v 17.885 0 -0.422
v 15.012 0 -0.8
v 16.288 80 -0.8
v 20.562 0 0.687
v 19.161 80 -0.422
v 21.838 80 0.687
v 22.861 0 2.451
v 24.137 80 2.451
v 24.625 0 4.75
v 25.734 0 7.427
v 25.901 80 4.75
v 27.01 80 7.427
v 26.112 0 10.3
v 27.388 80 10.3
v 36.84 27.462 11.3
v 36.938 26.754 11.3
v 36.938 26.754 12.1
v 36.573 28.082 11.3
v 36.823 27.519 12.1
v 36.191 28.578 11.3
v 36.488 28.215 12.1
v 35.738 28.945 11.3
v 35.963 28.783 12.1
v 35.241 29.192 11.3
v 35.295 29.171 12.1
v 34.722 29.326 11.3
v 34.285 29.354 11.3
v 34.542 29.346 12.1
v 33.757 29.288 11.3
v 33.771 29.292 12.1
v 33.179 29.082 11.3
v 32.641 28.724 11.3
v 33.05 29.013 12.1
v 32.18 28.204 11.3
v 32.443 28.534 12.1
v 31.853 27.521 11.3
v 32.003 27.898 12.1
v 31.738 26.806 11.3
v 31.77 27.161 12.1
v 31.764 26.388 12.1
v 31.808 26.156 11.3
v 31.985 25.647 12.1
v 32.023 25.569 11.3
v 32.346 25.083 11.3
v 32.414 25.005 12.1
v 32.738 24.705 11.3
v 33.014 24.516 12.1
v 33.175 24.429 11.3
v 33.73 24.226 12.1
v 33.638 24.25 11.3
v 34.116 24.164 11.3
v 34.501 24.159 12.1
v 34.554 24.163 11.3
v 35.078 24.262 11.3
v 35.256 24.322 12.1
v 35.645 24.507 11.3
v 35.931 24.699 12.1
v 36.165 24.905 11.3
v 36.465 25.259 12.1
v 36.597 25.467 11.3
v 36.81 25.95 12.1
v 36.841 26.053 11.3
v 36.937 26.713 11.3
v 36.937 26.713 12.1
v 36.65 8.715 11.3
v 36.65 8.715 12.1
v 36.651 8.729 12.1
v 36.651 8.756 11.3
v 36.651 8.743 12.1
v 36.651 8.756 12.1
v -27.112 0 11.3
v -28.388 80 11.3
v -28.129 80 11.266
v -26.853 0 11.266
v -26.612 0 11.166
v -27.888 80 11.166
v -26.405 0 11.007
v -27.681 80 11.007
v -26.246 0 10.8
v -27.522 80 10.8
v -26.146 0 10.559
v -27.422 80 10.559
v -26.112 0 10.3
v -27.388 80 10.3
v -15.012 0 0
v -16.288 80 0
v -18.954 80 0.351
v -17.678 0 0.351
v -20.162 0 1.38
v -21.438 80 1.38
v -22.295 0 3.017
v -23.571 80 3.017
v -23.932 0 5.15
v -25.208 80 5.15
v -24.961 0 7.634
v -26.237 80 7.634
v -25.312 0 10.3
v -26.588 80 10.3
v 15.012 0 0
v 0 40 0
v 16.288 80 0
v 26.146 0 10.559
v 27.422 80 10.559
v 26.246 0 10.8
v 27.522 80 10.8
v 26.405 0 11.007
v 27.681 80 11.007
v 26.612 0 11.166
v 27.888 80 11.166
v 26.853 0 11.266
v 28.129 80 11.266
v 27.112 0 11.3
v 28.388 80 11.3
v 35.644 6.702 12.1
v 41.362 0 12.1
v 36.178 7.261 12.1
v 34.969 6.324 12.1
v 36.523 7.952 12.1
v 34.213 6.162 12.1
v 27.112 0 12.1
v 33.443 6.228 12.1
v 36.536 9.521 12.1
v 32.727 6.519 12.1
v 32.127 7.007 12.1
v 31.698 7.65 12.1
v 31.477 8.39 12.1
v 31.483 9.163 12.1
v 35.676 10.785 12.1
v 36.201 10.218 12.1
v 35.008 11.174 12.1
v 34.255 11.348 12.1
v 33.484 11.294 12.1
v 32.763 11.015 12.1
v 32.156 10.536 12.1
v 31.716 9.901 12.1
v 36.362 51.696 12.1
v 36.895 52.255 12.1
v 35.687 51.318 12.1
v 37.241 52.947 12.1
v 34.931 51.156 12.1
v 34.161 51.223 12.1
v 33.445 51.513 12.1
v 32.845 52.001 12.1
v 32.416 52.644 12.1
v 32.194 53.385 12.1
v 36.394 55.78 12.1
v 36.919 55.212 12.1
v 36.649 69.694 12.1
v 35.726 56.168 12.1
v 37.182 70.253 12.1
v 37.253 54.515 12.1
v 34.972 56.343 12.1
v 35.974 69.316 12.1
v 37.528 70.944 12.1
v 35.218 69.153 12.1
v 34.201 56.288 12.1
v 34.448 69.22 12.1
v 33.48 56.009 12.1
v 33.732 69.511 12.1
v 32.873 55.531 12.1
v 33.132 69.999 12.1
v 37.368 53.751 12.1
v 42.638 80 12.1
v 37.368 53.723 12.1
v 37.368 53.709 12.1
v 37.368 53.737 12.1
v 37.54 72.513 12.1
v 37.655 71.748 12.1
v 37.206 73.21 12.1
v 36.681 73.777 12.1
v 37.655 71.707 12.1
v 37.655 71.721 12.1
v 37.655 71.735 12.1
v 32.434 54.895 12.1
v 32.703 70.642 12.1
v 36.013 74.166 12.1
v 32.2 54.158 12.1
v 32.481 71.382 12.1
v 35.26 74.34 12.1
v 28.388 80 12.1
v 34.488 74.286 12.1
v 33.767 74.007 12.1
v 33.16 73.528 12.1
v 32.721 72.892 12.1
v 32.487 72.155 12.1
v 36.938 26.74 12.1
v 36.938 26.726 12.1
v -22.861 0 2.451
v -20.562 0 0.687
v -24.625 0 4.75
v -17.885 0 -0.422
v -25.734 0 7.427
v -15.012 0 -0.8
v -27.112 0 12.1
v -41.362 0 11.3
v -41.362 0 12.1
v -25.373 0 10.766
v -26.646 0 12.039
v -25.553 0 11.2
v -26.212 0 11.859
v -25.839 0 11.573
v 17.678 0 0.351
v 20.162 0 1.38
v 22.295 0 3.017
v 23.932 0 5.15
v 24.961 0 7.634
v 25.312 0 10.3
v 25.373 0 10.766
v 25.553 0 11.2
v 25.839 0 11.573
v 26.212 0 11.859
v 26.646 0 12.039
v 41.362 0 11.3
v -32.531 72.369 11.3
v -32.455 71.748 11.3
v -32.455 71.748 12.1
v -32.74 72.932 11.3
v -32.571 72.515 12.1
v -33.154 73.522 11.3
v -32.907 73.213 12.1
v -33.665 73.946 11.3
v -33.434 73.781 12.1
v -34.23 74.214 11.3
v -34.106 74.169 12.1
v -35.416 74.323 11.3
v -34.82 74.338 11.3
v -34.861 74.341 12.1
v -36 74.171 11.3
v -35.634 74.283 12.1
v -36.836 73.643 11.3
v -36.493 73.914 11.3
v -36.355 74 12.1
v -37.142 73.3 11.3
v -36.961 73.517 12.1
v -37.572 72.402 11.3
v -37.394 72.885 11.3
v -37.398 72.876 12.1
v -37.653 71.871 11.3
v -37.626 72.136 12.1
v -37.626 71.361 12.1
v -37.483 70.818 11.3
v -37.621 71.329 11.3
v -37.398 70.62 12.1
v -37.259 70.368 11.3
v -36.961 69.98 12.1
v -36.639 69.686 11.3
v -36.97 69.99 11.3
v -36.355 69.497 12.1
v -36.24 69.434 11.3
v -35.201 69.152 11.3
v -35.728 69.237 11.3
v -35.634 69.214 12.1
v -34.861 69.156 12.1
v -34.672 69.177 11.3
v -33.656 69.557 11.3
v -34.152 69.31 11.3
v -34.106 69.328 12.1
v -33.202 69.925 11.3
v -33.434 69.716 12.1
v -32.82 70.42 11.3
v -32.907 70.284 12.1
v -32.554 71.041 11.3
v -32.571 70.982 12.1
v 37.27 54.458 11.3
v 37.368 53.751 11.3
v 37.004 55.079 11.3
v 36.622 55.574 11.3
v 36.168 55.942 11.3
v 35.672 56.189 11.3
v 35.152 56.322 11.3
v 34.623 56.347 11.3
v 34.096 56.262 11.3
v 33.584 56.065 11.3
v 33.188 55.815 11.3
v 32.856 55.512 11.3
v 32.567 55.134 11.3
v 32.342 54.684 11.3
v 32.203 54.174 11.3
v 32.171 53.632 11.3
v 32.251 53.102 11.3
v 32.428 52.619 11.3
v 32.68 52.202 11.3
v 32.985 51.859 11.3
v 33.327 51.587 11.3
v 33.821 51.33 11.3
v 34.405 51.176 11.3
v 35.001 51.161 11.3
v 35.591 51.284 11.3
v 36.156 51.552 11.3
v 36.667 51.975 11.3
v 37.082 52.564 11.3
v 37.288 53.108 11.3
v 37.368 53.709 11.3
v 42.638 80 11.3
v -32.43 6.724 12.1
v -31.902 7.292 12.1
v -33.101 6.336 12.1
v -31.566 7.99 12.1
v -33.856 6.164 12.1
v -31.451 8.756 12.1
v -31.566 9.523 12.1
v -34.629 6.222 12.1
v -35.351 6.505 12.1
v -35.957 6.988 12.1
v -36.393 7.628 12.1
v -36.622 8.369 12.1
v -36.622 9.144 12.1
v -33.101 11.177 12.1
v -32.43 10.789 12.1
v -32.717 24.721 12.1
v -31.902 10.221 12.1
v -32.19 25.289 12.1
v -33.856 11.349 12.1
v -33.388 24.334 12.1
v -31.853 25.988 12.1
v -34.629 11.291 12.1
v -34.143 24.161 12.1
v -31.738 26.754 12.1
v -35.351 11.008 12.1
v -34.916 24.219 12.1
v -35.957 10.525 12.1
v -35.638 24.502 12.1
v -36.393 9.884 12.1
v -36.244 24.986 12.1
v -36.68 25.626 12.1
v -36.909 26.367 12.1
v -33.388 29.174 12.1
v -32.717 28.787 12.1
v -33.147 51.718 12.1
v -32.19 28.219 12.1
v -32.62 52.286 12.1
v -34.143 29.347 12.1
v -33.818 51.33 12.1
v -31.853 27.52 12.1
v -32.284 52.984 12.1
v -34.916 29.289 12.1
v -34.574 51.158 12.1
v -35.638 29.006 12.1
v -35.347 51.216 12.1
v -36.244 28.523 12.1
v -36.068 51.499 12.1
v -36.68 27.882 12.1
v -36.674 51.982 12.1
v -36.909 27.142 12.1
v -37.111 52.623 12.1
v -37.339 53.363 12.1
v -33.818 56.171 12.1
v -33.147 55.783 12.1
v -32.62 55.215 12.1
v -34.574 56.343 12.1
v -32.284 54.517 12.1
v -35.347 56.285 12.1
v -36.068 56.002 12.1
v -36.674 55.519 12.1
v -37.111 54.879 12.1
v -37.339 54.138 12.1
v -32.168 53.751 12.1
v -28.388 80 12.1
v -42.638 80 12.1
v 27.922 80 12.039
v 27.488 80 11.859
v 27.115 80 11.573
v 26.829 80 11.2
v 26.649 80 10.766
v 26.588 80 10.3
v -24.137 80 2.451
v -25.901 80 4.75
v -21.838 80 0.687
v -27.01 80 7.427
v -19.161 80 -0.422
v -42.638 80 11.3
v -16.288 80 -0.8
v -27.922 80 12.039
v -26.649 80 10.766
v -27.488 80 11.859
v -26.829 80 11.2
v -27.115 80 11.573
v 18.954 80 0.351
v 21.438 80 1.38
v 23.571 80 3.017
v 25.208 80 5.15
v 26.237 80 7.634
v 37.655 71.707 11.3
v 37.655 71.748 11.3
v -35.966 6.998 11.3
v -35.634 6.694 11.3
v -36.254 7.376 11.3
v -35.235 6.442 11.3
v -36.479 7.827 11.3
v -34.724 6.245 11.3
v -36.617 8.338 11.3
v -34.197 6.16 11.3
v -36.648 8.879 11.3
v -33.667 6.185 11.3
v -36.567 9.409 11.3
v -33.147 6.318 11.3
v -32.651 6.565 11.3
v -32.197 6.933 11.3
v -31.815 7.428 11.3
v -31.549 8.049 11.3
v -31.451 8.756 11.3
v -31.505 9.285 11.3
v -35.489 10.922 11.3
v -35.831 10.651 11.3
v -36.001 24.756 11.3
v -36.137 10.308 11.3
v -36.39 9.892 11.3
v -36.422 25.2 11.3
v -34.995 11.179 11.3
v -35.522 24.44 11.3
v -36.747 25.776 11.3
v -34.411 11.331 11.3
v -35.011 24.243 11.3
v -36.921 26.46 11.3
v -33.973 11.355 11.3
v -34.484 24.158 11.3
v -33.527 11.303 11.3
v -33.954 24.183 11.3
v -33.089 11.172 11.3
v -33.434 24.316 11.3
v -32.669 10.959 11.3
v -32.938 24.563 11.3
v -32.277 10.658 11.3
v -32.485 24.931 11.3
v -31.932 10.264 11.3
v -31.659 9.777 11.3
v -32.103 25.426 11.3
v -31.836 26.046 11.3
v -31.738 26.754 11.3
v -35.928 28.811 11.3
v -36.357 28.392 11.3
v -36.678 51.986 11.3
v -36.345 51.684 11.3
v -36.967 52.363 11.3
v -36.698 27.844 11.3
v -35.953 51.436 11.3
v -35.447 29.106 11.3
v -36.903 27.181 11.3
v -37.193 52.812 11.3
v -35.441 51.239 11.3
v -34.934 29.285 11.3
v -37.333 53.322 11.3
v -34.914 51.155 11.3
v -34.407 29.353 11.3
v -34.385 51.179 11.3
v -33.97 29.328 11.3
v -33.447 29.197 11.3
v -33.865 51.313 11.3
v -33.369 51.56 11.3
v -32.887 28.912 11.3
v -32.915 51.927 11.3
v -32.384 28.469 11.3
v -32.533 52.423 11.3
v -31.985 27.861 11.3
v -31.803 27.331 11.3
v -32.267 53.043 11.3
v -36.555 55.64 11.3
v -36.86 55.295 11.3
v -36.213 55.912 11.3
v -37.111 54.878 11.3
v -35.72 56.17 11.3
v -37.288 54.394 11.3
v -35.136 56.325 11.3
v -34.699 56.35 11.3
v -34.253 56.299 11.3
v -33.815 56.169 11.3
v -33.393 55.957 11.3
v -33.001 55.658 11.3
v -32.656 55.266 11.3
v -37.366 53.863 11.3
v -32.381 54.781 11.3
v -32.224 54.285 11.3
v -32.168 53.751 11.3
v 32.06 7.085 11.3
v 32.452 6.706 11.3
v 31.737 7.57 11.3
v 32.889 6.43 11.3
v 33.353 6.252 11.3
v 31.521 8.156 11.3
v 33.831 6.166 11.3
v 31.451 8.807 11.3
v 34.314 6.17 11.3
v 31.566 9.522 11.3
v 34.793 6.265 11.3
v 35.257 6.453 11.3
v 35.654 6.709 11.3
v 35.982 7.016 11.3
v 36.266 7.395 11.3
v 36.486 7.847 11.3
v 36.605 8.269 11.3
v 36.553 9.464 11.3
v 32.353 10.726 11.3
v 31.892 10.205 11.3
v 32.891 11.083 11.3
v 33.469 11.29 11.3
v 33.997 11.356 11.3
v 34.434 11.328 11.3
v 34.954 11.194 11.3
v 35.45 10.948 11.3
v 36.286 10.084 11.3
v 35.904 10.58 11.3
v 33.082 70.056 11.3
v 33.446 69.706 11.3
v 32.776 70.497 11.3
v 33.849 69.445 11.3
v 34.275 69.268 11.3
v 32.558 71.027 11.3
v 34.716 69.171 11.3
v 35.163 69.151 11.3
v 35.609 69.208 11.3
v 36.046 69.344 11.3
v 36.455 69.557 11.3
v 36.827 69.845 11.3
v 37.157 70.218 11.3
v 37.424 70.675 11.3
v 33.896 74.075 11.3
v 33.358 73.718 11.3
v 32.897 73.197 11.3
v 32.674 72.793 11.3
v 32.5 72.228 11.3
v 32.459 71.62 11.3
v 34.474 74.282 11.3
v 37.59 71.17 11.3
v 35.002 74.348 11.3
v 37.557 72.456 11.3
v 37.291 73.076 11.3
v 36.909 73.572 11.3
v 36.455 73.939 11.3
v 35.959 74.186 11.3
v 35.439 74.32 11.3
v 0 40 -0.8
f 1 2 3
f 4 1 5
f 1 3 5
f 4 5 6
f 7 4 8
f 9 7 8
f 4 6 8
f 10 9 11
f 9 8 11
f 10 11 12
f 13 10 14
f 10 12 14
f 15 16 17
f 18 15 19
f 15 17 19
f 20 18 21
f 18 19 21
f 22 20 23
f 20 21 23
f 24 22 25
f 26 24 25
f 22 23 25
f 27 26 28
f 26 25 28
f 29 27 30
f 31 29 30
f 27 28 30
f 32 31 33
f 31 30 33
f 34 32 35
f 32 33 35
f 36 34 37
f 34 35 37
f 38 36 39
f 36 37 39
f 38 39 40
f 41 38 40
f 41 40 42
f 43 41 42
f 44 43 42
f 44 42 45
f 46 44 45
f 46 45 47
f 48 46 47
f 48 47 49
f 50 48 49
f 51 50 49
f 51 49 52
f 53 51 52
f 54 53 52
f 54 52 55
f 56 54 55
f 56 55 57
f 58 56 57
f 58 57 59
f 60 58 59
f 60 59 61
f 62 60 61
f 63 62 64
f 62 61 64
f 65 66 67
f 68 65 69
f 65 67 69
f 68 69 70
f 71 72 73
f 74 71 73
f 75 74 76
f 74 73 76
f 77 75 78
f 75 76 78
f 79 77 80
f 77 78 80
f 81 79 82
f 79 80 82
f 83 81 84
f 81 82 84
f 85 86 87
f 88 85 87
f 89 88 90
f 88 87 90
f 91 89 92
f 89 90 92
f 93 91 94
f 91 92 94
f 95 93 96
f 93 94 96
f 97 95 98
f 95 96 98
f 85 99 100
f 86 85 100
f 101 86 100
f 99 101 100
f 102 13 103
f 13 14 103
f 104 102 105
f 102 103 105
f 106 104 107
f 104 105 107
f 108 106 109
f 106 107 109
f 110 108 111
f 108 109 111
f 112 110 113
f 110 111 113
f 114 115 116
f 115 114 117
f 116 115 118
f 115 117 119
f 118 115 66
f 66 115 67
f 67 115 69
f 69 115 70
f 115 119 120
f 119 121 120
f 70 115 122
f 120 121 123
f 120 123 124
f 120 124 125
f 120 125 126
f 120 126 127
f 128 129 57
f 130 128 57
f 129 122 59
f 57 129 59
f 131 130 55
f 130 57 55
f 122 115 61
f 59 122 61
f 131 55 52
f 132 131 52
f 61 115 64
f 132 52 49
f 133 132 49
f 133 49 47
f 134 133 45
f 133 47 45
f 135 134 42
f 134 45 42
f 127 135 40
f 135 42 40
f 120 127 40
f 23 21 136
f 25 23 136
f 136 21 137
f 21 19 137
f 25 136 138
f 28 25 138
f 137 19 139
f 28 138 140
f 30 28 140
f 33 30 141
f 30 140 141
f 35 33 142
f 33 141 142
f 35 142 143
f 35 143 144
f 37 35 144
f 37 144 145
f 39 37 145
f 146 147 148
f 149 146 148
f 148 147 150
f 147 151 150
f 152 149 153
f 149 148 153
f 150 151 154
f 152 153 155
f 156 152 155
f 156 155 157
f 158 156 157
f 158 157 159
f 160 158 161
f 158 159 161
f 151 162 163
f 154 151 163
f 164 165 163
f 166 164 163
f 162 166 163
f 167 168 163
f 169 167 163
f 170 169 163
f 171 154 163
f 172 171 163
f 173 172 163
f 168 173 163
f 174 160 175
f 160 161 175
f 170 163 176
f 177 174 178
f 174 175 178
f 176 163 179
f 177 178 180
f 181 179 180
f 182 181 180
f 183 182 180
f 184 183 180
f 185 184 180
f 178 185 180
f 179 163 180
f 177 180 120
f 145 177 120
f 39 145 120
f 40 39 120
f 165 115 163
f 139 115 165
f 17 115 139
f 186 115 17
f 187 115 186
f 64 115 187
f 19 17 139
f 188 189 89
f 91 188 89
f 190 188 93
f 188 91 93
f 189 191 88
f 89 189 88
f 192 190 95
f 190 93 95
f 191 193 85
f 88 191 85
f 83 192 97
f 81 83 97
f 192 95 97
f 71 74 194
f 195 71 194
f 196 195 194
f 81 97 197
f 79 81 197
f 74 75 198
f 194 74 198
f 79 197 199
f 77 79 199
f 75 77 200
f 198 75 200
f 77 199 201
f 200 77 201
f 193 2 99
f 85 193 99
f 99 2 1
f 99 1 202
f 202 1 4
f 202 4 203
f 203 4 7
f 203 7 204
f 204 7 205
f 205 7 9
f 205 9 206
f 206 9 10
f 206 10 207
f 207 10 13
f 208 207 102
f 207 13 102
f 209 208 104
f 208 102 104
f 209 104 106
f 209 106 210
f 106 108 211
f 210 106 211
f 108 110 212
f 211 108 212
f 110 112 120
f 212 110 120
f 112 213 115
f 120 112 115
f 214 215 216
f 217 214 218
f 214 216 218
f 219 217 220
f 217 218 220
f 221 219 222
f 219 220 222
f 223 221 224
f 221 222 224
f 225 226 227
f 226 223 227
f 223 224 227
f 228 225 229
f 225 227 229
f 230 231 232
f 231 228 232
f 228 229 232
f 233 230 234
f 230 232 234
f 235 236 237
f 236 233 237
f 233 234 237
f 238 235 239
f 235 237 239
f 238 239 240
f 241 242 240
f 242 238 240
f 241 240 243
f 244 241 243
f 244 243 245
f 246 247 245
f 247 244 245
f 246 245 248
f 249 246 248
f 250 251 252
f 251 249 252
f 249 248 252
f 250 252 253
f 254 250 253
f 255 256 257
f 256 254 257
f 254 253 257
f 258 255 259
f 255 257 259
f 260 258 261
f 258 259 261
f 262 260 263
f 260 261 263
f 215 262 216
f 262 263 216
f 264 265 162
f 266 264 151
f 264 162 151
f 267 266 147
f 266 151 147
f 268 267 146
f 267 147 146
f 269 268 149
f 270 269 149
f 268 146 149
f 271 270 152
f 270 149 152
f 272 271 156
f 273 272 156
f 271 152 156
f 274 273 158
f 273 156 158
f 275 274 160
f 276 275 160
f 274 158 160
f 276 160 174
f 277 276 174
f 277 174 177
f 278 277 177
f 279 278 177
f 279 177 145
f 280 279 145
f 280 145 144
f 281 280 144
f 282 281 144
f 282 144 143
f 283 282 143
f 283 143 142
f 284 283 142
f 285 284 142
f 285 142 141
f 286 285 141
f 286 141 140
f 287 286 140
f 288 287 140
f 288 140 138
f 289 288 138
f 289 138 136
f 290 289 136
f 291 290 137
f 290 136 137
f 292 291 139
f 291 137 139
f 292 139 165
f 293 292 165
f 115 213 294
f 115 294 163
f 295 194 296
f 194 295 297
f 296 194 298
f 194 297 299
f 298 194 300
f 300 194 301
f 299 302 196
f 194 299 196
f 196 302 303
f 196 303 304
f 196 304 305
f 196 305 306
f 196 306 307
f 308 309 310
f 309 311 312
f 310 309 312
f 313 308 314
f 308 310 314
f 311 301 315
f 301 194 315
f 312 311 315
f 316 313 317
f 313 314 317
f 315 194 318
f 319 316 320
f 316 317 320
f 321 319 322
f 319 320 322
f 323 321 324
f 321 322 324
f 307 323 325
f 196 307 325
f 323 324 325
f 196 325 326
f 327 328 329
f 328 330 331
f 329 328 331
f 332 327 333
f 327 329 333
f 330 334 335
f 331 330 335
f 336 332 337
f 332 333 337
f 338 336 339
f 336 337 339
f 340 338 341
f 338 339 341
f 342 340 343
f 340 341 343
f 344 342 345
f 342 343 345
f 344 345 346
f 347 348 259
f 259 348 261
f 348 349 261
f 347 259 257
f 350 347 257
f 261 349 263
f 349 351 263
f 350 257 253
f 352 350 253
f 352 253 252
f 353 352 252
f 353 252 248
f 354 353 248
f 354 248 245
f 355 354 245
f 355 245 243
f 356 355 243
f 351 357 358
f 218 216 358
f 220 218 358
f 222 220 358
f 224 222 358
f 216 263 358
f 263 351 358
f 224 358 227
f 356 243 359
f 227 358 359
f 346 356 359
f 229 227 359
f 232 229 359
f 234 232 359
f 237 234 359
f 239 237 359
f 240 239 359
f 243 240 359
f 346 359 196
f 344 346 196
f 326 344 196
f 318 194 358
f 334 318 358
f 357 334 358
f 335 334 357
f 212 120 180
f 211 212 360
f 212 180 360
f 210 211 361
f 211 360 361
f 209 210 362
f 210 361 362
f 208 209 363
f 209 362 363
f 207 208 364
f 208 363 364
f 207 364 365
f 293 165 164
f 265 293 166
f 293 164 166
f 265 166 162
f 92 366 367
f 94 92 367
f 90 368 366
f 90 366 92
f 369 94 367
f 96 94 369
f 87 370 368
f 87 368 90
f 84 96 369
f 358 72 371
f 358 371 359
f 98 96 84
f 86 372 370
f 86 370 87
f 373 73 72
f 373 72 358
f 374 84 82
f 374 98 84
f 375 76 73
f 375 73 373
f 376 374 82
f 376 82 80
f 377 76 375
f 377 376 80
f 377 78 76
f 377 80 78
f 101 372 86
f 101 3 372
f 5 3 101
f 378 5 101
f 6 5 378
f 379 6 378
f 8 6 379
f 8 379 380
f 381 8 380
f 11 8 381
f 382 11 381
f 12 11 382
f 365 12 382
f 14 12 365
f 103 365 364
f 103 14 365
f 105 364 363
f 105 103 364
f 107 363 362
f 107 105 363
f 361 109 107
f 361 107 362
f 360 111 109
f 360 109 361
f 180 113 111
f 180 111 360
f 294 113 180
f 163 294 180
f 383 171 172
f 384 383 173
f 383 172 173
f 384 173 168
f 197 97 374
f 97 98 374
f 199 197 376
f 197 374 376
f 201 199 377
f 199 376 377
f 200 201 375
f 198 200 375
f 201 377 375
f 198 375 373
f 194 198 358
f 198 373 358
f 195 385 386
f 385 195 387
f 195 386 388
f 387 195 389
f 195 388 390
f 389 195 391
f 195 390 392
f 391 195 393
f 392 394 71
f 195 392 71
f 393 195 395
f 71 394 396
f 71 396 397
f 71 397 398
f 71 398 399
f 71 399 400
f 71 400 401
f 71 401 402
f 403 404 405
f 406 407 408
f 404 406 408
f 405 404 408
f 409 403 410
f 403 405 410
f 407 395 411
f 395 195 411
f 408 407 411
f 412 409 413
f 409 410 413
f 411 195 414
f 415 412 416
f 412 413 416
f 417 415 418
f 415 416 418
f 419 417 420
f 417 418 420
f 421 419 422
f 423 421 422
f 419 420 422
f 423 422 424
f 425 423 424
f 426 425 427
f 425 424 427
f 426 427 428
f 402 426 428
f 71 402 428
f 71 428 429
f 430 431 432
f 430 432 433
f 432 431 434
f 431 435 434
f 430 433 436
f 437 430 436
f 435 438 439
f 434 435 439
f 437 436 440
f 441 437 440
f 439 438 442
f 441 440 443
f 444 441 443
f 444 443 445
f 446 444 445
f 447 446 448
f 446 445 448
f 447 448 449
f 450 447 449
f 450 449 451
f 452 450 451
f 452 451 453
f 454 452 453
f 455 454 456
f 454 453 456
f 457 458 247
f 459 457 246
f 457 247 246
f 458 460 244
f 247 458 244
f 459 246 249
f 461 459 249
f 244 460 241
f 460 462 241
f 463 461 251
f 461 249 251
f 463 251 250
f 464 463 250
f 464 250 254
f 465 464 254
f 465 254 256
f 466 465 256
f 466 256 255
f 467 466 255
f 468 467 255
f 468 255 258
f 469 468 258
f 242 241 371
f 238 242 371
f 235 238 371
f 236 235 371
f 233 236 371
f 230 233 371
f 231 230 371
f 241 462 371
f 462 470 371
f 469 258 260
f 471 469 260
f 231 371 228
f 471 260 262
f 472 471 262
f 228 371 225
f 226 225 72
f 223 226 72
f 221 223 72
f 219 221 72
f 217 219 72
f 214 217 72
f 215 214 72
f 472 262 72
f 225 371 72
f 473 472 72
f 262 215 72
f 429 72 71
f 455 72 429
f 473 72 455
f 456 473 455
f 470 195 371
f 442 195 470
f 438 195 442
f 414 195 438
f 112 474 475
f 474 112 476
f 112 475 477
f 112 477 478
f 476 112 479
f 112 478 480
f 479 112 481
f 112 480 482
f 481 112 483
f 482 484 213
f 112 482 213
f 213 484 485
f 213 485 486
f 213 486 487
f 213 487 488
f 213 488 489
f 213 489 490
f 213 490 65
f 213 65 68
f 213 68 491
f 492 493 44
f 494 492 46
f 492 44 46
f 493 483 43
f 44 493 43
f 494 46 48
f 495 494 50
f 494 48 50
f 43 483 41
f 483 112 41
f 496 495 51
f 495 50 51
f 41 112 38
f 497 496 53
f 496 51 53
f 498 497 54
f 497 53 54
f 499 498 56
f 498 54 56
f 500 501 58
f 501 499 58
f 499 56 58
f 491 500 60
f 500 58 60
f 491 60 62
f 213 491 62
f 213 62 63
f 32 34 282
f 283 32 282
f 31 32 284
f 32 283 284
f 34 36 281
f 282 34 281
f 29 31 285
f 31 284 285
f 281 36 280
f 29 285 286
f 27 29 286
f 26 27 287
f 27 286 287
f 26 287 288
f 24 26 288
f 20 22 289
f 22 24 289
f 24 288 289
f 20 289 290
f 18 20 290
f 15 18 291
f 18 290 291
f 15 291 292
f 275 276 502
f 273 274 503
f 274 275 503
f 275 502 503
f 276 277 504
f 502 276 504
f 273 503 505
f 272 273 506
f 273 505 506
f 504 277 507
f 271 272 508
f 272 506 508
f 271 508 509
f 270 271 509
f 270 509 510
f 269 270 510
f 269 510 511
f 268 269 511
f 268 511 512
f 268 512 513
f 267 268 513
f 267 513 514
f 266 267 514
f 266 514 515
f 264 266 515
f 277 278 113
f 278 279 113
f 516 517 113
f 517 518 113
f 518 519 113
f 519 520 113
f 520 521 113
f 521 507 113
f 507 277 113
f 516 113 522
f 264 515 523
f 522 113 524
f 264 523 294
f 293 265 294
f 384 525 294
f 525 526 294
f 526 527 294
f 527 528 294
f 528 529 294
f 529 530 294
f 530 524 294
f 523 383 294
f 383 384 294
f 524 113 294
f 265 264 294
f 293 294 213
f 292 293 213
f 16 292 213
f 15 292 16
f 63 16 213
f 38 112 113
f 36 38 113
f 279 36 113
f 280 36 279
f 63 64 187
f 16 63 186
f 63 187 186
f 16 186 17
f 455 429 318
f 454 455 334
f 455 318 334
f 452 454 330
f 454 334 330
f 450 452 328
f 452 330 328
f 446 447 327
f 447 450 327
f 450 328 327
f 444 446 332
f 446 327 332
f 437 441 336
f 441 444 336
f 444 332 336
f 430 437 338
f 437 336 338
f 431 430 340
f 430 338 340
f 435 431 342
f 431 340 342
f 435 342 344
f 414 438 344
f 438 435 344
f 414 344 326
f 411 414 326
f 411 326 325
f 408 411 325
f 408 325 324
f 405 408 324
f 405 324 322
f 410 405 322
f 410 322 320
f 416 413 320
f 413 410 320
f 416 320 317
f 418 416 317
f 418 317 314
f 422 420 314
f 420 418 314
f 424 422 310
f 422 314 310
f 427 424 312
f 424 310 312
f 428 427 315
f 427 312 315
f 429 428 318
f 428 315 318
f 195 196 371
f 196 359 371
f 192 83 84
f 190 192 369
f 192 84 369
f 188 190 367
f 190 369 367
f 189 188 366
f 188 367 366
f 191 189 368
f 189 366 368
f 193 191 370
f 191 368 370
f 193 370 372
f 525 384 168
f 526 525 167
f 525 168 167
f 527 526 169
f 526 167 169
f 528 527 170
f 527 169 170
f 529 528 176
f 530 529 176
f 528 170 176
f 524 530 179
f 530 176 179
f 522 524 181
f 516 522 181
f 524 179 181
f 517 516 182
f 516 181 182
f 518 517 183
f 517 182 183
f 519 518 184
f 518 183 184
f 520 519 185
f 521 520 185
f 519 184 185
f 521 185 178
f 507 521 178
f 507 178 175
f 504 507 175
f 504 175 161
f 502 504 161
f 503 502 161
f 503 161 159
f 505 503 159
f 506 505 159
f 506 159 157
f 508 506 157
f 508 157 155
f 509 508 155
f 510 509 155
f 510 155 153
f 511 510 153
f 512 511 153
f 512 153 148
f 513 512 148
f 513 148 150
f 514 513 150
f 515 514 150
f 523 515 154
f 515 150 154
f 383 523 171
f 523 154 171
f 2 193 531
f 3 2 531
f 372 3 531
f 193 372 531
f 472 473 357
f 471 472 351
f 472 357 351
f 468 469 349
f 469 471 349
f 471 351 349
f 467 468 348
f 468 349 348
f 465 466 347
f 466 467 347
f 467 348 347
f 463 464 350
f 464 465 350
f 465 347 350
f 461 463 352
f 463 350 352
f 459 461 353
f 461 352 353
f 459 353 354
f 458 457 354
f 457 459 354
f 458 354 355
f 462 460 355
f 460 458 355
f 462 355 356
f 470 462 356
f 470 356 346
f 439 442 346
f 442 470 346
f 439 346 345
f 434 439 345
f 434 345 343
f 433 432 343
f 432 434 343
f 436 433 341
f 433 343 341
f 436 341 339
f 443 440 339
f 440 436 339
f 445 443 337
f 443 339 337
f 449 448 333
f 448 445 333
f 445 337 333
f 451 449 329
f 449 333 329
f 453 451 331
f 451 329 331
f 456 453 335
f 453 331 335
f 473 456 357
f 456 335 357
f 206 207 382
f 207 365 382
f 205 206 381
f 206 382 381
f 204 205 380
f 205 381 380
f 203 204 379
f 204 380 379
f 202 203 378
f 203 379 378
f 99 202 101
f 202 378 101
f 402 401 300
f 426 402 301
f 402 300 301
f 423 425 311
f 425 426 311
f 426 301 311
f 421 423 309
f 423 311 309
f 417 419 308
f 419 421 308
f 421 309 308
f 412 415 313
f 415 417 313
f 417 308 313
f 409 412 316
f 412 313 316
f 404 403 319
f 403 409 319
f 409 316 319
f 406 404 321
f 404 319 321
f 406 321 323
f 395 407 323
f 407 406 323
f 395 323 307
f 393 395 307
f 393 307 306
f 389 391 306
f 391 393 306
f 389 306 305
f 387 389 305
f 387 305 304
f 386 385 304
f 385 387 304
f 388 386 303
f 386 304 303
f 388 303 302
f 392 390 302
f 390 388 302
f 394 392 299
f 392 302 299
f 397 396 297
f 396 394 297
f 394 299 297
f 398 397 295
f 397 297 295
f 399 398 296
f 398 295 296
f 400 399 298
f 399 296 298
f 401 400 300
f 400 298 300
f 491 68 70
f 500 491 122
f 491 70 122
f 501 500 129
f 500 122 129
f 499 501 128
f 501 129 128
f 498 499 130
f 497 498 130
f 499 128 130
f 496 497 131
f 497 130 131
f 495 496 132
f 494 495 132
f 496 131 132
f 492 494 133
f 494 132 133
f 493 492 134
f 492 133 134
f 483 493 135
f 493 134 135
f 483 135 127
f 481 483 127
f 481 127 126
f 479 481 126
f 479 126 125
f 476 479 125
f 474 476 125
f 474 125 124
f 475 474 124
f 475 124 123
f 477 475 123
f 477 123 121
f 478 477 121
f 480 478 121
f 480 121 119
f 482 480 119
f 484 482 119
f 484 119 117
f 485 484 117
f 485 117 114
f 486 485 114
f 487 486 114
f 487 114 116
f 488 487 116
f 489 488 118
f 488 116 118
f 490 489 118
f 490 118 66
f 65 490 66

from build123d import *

# Parameters (mm, degrees)
F4_R     = 2.6
F5_DEPTH = 12.901


with BuildPart() as f3:
    # F0 (on Front) → F3 section 0
    with BuildSketch(Plane.XZ):
        with BuildLine():
            Line((-27.112, 12.1), (-41.362, 12.1))
            Line((-41.362, 12.1), (-41.362, 11.3))
            Line((-41.362, 11.3), (-27.112, 11.3))
            ThreePointArc((-27.112, 11.3), (-26.404893, 11.007107), (-26.112, 10.3))
            ThreePointArc((-26.112, 10.3), (-22.860885, 2.451115), (-15.012, -0.8))
            Line((-15.012, -0.8), (15.012, -0.8))
            ThreePointArc((15.012, -0.8), (22.860885, 2.451115), (26.112, 10.3))
            ThreePointArc((26.112, 10.3), (26.404893, 11.007107), (27.112, 11.3))
            Line((27.112, 11.3), (41.362, 11.3))
            Line((41.362, 11.3), (41.362, 12.1))
            Line((41.362, 12.1), (27.112, 12.1))
            ThreePointArc((27.112, 12.1), (25.839208, 11.572792), (25.312, 10.3))
            ThreePointArc((25.312, 10.3), (22.2952, 3.0168), (15.012, 0))
            Line((15.012, 0), (-15.012, 0))
            ThreePointArc((-15.012, 0), (-22.2952, 3.0168), (-25.312, 10.3))
            ThreePointArc((-25.312, 10.3), (-25.839208, 11.572792), (-27.112, 12.1))
        make_face()
    # F2 (on offset) → F3 section 1
    with BuildSketch(Plane.XZ.offset(-80)):
        with BuildLine():
            Line((-28.387997, 12.1), (-42.637997, 12.1))
            Line((-42.637997, 12.1), (-42.637997, 11.3))
            Line((-42.637997, 11.3), (-28.387997, 11.3))
            ThreePointArc((-28.387997, 11.3), (-27.680891, 11.007107), (-27.387997, 10.3))
            ThreePointArc((-27.387997, 10.3), (-24.136883, 2.451115), (-16.287997, -0.8))
            Line((-16.287997, -0.8), (16.288003, -0.8))
            ThreePointArc((16.288003, -0.8), (24.136888, 2.451115), (27.388003, 10.3))
            ThreePointArc((27.388003, 10.3), (27.680896, 11.007107), (28.388003, 11.3))
            Line((28.388003, 11.3), (42.638003, 11.3))
            Line((42.638003, 11.3), (42.638003, 12.1))
            Line((42.638003, 12.1), (28.388003, 12.1))
            ThreePointArc((28.388003, 12.1), (27.11521, 11.572792), (26.588003, 10.3))
            ThreePointArc((26.588003, 10.3), (23.571203, 3.0168), (16.288003, 0))
            Line((16.288003, 0), (-16.288003, 0))
            ThreePointArc((-16.288003, 0), (-23.571199, 3.016802), (-26.587997, 10.3))
            ThreePointArc((-26.587997, 10.3), (-27.115205, 11.572792), (-28.387997, 12.1))
        make_face()
    loft()

    # F4 (on face) → F5 (cut, through all)
    with BuildSketch(Plane.XY.offset(12.1)):
        with Locations((-35.055441, 71.748368)):
            Circle(F4_R)
        with Locations((-34.768377, 53.750657)):
            Circle(F4_R)
        with Locations((-34.337781, 26.754091)):
            Circle(F4_R)
        with Locations((-34.050717, 8.75638)):
            Circle(F4_R)
        with BuildLine():
            ThreePointArc((36.650386, 8.714916), (36.650634, 8.735647), (36.650717, 8.75638))
            ThreePointArc((36.650717, 8.75638), (31.4508, 8.777113), (36.650386, 8.714916))
        make_face()
        with BuildLine():
            ThreePointArc((36.93745, 26.712626), (36.937698, 26.733358), (36.937781, 26.754091))
            ThreePointArc((36.937781, 26.754091), (31.737864, 26.774824), (36.93745, 26.712626))
        make_face()
        with BuildLine():
            ThreePointArc((37.368047, 53.709193), (37.368295, 53.729924), (37.368377, 53.750657))
            ThreePointArc((37.368377, 53.750657), (32.16846, 53.77139), (37.368047, 53.709193))
        make_face()
        with BuildLine():
            ThreePointArc((37.655111, 71.706903), (37.655359, 71.727635), (37.655441, 71.748368))
            ThreePointArc((37.655441, 71.748368), (32.455524, 71.769101), (37.655111, 71.706903))
        make_face()
    extrude(amount=-F5_DEPTH, mode=Mode.SUBTRACT)


solid = f3.part
